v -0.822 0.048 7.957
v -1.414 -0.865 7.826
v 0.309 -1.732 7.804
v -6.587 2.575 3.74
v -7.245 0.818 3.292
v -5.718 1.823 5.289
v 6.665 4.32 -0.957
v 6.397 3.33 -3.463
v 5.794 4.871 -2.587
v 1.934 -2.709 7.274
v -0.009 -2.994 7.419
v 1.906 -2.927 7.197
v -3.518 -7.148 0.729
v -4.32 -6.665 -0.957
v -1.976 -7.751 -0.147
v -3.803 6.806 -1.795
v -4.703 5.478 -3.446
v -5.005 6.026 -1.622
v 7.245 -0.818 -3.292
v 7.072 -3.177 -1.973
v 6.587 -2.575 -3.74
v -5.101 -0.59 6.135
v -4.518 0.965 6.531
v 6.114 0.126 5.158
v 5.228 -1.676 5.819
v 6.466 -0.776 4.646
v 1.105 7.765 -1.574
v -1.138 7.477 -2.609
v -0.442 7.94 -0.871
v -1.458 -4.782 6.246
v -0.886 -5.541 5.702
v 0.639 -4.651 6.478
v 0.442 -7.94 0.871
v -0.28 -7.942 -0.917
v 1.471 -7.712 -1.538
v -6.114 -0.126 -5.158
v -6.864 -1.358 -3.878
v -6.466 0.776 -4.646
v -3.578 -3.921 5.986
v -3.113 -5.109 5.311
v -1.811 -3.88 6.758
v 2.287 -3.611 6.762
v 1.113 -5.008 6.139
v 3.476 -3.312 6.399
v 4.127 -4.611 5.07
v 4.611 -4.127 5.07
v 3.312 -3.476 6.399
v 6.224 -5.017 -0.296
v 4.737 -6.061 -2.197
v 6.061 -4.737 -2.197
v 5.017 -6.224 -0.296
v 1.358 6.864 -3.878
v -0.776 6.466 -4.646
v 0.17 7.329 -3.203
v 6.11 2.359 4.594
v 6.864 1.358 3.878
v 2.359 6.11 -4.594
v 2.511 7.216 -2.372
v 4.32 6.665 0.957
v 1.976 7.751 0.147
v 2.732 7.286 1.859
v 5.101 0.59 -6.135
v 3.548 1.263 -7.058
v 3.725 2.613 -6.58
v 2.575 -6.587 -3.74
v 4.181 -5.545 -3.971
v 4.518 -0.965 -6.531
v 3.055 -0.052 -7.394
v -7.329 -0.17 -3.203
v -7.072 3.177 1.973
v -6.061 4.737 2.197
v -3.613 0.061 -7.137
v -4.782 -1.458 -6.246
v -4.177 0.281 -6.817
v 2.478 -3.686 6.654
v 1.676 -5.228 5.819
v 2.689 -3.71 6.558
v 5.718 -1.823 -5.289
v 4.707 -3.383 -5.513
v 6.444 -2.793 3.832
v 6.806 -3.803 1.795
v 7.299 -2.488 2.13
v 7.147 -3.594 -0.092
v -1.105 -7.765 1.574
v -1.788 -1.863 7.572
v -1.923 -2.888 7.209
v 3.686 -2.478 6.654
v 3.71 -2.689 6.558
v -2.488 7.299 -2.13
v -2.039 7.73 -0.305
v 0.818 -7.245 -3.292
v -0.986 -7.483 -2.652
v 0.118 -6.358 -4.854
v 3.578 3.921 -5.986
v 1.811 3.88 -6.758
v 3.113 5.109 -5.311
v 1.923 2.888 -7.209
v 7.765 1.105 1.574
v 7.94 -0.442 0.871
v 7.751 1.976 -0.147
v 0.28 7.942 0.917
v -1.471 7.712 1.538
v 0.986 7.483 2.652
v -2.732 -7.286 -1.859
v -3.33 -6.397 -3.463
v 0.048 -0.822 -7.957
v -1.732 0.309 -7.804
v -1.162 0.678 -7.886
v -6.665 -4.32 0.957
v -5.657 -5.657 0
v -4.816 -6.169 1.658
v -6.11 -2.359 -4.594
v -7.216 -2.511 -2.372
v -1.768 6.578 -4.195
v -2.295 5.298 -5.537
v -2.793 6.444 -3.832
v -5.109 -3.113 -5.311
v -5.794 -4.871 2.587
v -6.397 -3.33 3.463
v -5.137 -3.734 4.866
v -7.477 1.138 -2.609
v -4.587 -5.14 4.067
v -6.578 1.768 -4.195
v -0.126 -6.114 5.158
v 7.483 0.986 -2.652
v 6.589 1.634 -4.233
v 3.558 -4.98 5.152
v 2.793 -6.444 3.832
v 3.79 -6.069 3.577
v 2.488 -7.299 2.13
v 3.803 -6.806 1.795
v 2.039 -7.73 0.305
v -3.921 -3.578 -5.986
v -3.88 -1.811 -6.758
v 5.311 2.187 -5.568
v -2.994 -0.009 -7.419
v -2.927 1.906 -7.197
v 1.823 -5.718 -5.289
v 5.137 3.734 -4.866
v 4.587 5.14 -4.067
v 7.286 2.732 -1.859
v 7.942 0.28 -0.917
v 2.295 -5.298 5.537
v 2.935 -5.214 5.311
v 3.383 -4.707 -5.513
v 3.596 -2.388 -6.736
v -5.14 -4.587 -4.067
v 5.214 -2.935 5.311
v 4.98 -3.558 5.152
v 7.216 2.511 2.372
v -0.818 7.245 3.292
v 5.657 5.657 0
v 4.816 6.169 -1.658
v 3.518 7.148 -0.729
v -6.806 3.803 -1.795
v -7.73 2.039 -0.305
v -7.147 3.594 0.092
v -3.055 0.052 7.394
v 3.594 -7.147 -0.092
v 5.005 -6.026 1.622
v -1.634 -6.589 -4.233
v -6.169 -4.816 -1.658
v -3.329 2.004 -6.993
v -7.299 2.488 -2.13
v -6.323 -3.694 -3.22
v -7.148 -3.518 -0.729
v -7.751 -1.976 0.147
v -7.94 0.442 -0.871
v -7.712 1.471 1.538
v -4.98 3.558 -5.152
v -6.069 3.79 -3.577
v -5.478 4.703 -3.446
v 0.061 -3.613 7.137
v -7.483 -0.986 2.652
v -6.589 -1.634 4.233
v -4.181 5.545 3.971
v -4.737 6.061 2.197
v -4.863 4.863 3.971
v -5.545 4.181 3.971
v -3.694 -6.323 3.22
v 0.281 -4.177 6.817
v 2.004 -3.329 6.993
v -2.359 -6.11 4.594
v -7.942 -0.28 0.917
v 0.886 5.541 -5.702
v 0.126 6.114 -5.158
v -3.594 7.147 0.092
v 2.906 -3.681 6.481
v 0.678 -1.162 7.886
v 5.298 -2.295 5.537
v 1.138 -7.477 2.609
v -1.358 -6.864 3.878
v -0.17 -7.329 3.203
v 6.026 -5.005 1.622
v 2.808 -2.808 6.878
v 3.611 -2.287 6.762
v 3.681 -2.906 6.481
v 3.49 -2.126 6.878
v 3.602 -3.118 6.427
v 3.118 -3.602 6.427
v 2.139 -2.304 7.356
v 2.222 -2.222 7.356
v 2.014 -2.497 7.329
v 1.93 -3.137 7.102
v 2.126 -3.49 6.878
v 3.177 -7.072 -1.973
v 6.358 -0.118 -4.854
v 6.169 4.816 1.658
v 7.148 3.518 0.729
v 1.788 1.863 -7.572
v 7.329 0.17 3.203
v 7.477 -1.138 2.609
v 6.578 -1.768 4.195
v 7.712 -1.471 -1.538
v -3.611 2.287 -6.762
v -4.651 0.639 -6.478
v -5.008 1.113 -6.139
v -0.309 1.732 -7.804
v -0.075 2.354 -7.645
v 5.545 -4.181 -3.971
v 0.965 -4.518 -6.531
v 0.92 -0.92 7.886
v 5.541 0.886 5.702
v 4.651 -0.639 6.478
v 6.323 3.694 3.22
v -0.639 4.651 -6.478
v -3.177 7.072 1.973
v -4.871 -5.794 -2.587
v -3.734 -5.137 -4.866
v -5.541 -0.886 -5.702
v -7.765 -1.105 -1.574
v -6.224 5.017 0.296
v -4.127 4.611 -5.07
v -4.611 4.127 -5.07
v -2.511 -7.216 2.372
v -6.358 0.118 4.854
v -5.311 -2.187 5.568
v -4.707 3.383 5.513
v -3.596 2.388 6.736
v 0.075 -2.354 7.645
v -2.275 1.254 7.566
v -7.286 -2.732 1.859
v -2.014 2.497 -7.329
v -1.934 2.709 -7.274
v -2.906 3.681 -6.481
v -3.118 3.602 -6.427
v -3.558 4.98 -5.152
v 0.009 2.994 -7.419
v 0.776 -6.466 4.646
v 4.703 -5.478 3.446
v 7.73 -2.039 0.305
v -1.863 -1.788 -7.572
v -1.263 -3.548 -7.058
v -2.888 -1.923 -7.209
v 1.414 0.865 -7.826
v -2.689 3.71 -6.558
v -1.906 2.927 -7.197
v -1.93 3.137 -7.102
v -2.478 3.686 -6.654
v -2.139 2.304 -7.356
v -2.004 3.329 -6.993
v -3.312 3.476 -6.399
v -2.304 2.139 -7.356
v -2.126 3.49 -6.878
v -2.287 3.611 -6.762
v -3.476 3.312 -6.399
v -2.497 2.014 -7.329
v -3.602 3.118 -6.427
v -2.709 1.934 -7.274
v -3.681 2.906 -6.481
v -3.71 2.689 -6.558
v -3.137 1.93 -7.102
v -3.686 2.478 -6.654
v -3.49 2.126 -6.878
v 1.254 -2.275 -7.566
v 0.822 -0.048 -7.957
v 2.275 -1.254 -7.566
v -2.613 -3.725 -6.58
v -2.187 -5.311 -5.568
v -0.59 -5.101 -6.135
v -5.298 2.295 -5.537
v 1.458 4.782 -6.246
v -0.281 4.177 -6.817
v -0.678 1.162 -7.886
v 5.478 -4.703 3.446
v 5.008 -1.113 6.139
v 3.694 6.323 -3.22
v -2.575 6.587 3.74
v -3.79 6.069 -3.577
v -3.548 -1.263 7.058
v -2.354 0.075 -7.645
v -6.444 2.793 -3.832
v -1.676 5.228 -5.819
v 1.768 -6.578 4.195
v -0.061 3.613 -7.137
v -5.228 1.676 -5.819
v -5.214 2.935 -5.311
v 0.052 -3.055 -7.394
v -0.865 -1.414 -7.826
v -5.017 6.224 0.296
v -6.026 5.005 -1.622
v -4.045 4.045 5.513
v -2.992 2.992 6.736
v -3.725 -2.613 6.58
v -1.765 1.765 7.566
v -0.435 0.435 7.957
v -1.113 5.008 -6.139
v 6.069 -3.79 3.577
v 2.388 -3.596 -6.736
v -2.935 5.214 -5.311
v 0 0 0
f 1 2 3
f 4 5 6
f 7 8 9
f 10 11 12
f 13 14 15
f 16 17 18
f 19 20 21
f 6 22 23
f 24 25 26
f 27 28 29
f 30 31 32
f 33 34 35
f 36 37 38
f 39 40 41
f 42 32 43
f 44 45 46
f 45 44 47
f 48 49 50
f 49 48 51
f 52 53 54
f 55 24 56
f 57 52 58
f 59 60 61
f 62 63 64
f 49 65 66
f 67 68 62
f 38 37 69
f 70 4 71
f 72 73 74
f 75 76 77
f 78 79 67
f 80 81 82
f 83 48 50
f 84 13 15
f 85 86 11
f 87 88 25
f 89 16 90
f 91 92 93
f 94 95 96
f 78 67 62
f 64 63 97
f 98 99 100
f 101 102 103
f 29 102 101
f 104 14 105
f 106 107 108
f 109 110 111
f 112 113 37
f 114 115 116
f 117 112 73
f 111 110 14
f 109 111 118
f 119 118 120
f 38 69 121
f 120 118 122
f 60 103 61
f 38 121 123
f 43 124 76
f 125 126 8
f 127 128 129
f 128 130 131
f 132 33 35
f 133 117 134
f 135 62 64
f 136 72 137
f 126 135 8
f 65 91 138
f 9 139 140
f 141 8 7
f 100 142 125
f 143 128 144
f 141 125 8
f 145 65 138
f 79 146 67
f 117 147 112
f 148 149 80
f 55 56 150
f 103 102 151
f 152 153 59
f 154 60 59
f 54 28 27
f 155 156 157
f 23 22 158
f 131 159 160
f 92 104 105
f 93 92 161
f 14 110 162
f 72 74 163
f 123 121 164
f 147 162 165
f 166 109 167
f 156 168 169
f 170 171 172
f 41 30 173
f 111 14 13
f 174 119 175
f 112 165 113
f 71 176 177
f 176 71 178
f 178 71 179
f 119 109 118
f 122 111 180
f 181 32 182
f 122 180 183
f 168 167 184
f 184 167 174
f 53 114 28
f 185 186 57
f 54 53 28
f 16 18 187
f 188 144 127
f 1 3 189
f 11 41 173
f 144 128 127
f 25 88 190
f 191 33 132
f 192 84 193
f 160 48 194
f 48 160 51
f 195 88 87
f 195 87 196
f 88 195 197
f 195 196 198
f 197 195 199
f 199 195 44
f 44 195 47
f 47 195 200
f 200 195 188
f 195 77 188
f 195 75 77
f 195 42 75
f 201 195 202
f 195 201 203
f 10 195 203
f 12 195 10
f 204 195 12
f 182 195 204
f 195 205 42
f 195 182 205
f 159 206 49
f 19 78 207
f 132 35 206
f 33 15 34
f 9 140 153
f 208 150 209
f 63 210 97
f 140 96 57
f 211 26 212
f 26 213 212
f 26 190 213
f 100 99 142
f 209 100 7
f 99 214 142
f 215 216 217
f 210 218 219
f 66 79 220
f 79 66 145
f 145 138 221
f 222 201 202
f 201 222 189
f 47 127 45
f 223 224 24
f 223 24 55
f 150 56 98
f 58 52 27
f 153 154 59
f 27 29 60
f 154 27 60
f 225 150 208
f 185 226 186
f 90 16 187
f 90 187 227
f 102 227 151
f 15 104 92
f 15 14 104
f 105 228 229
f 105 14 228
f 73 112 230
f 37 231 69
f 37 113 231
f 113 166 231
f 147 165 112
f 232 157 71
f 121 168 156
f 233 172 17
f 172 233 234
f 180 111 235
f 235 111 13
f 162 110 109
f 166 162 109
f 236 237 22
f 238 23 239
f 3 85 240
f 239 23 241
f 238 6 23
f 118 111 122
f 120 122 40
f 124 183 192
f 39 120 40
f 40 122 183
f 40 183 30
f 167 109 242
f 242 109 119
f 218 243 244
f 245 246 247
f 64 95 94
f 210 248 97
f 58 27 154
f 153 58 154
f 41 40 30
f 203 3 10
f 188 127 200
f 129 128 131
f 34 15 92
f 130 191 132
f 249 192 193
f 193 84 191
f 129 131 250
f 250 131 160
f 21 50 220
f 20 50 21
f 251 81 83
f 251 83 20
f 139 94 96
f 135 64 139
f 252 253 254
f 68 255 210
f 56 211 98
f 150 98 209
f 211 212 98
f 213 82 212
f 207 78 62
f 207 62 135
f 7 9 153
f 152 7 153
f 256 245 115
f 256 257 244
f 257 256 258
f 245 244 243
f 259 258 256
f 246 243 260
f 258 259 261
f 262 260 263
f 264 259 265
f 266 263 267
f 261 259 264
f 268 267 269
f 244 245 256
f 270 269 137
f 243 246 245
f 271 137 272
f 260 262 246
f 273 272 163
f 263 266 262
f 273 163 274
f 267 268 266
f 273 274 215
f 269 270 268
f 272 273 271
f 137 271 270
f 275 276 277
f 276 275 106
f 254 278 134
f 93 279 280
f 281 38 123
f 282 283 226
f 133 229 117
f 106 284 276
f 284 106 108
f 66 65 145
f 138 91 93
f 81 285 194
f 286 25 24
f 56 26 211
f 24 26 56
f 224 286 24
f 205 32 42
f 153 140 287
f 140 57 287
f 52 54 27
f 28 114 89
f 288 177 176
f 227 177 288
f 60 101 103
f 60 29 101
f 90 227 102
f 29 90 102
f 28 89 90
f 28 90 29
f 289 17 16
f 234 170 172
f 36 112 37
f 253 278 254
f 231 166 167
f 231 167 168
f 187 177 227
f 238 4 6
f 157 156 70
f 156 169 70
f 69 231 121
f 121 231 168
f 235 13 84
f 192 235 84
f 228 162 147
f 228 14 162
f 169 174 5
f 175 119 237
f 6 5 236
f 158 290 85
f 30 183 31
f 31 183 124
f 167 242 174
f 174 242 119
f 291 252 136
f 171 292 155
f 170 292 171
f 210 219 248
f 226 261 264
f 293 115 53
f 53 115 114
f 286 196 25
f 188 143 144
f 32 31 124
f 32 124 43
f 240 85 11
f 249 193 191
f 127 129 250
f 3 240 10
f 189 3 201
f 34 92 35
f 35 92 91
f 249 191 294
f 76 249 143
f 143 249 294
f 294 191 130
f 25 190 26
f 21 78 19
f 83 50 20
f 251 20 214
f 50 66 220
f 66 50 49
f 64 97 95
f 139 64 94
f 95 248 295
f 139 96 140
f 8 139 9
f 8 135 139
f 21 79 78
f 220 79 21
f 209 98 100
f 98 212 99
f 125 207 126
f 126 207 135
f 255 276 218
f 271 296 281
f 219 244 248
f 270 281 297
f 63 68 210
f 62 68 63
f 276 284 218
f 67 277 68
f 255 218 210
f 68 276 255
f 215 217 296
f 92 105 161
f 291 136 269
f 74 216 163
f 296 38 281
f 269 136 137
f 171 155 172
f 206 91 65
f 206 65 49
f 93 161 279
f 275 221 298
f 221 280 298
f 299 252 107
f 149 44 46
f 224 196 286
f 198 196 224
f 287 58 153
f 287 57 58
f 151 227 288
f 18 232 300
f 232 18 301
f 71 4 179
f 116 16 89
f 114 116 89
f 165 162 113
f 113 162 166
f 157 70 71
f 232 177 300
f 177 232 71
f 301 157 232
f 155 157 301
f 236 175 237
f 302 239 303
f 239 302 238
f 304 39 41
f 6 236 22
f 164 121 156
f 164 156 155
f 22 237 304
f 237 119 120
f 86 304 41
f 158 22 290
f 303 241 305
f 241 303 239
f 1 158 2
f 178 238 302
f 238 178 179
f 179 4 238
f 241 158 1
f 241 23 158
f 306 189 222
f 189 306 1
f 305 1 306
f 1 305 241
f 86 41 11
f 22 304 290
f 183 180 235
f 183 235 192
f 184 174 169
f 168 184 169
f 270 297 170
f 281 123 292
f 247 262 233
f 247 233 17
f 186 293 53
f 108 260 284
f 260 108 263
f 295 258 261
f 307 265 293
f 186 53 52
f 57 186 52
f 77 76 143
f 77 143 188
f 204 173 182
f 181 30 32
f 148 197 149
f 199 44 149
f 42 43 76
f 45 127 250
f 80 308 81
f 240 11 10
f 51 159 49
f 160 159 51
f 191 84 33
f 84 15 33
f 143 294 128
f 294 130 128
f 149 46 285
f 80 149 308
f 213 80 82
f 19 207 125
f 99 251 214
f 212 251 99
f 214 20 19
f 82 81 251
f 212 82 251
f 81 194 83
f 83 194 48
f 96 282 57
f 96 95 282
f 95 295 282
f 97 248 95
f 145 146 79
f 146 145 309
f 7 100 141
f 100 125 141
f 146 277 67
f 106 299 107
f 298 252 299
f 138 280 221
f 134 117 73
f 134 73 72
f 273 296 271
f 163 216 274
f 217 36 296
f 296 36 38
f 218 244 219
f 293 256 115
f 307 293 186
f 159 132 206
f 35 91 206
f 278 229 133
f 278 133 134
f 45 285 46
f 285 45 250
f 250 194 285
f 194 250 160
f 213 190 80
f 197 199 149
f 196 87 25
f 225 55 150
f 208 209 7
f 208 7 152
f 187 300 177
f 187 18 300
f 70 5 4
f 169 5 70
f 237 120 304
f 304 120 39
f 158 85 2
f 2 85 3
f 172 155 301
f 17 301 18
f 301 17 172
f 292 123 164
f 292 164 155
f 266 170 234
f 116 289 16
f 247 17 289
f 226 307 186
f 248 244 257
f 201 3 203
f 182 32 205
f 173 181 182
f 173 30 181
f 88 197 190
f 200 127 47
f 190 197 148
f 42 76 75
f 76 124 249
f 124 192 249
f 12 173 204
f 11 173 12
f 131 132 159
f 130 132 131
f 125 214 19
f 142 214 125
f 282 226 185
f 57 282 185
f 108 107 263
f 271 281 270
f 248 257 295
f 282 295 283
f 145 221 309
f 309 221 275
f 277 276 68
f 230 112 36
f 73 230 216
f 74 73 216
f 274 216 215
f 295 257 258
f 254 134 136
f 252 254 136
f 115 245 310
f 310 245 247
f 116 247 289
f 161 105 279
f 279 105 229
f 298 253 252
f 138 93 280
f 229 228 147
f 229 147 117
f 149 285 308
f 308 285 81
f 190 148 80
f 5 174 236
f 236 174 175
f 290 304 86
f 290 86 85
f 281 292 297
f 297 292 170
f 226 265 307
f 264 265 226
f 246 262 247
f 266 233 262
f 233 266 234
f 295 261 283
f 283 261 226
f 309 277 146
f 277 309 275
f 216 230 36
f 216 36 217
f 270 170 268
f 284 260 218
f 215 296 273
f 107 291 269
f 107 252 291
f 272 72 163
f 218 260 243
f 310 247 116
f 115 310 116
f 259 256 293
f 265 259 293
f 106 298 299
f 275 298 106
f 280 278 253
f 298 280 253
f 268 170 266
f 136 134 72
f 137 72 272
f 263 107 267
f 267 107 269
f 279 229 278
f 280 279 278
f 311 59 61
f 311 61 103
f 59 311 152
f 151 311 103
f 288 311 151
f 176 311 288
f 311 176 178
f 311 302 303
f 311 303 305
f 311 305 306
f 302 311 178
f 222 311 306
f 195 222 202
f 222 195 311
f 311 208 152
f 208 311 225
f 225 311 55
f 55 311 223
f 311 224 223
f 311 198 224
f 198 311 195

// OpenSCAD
// Generated by generate_scads.py
rotate([30,0,45]) {
  difference() {
    sphere(r=8);
    cube(size=[10,20,30], center=false);
  }
}
